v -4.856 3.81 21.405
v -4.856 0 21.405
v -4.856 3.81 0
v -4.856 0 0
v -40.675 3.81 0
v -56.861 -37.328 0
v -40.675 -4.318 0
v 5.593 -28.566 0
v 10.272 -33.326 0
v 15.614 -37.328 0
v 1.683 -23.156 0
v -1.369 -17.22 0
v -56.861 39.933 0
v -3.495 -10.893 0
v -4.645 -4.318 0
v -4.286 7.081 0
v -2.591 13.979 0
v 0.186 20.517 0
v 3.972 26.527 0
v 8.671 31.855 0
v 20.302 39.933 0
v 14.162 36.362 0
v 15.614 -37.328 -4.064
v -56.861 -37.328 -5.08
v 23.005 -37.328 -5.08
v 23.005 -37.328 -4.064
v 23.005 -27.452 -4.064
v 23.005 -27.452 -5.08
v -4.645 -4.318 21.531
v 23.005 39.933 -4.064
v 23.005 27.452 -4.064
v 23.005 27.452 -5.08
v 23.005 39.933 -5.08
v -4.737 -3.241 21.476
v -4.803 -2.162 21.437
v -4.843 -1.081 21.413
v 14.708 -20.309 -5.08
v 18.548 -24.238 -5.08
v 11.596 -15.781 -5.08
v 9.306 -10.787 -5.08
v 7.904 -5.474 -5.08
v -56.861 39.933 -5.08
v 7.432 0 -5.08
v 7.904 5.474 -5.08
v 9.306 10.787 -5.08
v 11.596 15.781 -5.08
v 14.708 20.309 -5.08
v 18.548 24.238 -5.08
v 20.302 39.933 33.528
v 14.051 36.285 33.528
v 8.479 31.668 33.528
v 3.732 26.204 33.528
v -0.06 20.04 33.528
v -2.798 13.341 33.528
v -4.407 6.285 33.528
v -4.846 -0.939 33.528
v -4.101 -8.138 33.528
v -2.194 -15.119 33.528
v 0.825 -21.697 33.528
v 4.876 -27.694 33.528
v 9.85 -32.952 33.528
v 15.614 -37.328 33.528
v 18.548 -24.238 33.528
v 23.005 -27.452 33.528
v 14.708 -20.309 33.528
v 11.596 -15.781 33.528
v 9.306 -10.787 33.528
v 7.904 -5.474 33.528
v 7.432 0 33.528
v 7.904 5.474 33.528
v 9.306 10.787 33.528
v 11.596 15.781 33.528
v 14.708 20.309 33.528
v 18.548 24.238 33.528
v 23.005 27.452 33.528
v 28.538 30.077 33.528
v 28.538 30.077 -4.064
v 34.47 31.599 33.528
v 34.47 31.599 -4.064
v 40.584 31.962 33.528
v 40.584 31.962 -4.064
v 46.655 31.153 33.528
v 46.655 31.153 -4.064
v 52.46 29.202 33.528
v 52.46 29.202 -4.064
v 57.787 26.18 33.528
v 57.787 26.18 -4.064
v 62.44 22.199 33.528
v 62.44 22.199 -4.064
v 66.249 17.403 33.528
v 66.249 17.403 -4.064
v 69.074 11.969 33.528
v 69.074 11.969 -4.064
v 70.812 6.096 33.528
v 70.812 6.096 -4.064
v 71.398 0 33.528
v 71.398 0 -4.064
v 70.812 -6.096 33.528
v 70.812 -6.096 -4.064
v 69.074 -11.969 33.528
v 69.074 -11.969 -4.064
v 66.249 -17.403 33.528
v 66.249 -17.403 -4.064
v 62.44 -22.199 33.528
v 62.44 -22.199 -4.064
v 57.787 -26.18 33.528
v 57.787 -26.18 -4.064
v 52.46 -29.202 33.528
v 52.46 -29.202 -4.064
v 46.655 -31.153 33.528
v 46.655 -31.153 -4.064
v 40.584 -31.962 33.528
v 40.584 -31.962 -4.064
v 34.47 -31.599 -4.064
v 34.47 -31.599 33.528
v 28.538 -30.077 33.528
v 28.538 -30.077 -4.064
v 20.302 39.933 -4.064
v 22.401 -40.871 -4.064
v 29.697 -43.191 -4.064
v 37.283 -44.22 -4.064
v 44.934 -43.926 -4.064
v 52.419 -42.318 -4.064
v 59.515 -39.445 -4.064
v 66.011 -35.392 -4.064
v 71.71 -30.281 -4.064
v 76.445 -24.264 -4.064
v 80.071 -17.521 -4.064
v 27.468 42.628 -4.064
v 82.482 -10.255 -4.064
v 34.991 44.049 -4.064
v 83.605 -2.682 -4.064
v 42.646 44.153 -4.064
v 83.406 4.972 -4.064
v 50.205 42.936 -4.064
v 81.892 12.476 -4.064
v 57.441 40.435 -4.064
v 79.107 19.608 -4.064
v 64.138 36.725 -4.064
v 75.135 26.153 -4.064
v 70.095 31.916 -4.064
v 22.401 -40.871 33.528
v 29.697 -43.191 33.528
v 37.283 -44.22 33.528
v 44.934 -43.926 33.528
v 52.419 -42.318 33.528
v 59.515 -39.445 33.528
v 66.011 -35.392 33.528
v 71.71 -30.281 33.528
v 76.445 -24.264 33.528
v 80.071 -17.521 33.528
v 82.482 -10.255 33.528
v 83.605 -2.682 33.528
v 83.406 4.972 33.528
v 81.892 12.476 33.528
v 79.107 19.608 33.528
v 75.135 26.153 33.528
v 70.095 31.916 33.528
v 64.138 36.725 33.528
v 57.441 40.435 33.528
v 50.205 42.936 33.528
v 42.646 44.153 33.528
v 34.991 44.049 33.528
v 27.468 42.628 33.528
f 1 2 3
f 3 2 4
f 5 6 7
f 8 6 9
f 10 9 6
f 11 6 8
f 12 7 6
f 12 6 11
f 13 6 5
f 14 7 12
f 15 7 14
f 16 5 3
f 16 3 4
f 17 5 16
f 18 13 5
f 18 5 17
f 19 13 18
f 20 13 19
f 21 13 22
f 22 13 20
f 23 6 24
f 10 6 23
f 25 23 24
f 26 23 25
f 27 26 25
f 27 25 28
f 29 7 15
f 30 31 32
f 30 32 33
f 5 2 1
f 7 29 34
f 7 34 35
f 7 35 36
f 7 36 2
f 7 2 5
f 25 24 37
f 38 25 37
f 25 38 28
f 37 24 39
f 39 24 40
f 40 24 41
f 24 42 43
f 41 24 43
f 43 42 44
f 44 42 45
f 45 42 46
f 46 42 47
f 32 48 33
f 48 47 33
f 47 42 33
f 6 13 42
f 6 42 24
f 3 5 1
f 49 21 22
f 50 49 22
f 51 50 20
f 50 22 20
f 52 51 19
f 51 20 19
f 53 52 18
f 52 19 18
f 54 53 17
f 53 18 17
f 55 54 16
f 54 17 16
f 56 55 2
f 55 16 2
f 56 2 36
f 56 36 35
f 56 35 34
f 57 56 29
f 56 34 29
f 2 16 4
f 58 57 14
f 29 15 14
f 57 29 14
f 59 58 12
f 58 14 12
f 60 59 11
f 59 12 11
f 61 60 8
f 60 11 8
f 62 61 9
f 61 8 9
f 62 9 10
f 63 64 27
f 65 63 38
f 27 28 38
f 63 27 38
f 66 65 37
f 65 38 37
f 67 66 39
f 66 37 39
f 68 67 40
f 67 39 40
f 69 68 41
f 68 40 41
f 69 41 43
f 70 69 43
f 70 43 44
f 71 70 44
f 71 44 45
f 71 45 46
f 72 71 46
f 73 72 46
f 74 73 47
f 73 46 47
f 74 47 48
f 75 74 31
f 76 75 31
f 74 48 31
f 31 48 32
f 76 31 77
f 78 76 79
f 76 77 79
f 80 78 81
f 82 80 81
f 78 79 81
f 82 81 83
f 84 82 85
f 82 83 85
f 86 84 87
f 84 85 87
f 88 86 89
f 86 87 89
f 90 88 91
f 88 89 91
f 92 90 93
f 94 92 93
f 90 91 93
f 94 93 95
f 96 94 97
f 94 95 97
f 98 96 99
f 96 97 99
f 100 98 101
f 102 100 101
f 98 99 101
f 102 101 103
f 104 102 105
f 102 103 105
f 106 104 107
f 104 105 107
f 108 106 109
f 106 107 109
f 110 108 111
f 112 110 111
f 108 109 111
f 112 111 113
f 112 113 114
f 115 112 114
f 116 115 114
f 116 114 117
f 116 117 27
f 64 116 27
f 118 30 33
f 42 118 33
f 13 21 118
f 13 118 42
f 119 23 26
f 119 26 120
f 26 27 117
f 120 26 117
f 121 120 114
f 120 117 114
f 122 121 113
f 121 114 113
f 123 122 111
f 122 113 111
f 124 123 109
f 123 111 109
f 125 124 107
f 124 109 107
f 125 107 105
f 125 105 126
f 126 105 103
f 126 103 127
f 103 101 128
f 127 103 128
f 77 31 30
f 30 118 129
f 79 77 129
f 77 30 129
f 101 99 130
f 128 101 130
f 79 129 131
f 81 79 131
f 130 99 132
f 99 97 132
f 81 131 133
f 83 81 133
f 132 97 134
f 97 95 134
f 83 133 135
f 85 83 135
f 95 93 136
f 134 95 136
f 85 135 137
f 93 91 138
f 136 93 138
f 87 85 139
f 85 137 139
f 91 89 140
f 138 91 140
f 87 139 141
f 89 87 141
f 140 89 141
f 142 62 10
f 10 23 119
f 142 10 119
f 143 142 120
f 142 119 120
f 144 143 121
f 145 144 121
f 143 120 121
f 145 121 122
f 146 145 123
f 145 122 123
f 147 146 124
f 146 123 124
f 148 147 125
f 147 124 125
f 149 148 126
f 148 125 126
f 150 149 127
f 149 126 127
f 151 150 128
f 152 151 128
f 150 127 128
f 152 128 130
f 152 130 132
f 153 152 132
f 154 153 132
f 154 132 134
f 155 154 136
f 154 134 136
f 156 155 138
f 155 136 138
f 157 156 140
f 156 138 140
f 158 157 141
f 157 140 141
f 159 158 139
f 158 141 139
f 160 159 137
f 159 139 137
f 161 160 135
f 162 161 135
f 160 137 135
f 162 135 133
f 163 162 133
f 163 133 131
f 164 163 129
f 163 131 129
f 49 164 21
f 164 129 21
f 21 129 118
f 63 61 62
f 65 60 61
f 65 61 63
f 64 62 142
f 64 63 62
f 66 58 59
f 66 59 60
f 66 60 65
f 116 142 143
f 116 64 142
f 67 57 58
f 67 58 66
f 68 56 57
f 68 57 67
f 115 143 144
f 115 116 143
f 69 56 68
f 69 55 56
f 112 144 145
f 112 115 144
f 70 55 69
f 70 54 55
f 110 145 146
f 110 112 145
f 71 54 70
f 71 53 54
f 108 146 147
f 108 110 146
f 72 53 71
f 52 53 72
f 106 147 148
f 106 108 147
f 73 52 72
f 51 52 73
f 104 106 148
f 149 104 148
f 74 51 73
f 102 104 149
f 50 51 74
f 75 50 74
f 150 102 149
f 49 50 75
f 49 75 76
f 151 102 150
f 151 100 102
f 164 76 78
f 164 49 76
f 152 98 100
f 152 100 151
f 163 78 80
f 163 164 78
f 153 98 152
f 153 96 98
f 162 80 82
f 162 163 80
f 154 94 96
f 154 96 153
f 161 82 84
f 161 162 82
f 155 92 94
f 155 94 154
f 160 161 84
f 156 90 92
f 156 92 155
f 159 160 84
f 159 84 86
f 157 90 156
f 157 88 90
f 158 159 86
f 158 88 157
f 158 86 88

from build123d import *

# Parameters (mm, degrees)
F0_W     = 56.8606331944
F0_H     = 37.3283550143
F0_H_2   = 39.9326570332
F0_W_2   = 23.0046827346
F1_DEPTH = 5.08
F2_R     = 44.2709641818
F3_DEPTH = 33.528
F4_DEPTH = 4.064
F5_DEPTH = 123.698
F7_DEPTH = 4.318
F8_DEPTH = 3.81


with BuildPart() as f1:
    # F0 (on Top) → F1 (new body)
    with BuildSketch(Plane.XY):
        with Locations((-28.4303165972, -18.6641775072)):
            Rectangle(F0_W, F0_H)
        with Locations((-28.4303165972, 19.9663285166)):
            Rectangle(F0_W, F0_H_2)
        with Locations((11.5023413673, 19.9663285166)):
            Rectangle(F0_W_2, F0_H_2)
        with Locations((11.5023413673, -18.6641775072)):
            Rectangle(F0_W_2, F0_H)
    extrude(amount=-F1_DEPTH)

    # F2 (on face) → F3 (join)
    with BuildSketch(Plane.XY):
        with Locations((39.4151285291, 0)):
            Circle(F2_R)
        with BuildLine():
            ThreePointArc((7.4318216845, 0), (39.4151285291, 31.9833068446), (71.3984353737, 0))
            ThreePointArc((71.3984353737, 0), (39.4151285291, -31.9833068446), (7.4318216845, 0))
        make_face(mode=Mode.SUBTRACT)
        with BuildLine():
            ThreePointArc((23.0046827346, -27.4523074721), (11.5961400498, -15.7808680594), (7.4318216845, 0))
            ThreePointArc((7.4318216845, 0), (11.5961400498, 15.7808680594), (23.0046827346, 27.4523074721))
            Line((23.0046827346, 27.4523074721), (23.0046827346, 39.9326570332))
            Line((23.0046827346, 39.9326570332), (20.3022749521, 39.9326570332))
            ThreePointArc((20.3022749521, 39.9326570332), (-4.7745397503, 2.6816947903), (15.6136121591, -37.3283550143))
            Line((15.6136121591, -37.3283550143), (23.0046827346, -37.3283550143))
            Line((23.0046827346, -37.3283550143), (23.0046827346, -27.4523074721))
        make_face()
    extrude(amount=F3_DEPTH)

    # F4 (add): a face of the model
    f4_faces = [f1.faces().sort_by_distance(p)[0] for p in [
        (60.1643011313, -37.8384648316, 0),
    ]]
    extrude(f4_faces, amount=F4_DEPTH)

    # F5 (cut): a face of the model
    f5_faces = [f1.faces().sort_by_distance(p)[0] for p in [
        (16.6239663947, 0, 0),
    ]]
    extrude(f5_faces, amount=-F5_DEPTH, mode=Mode.SUBTRACT)

    # F6 (on Front) → F7 (join)
    with BuildSketch(Plane.XZ):
        Polygon((-40.6748019159, 0), (0, 0), (0, 24.306833744), align=None)
    extrude(amount=F7_DEPTH)

    # F8 (add): a face of the model
    f8_faces = [f1.faces().sort_by_distance(p)[0] for p in [
        (-16.7954910738, 0, 7.1350124797),
    ]]
    extrude(f8_faces, amount=F8_DEPTH)


solid = f1.part
